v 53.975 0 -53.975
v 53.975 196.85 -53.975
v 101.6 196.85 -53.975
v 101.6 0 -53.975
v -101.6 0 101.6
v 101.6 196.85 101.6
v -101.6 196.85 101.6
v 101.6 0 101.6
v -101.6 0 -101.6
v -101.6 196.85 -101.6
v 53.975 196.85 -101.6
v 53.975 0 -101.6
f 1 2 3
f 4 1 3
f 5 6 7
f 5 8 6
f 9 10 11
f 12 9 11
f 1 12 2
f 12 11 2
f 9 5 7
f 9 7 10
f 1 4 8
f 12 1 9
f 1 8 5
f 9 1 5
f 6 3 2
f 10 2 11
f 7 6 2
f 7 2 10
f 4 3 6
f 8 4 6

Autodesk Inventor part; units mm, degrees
ref_plane "YZ Plane" through (0, 0, 0) normal (1, 0, 0) x (0, 1, 0)
ref_plane "XZ Plane" through (0, 0, 0) normal (0, 1, 0) x (-1, 0, 0)
ref_plane "XY Plane" through (0, 0, 0) normal (0, 0, 1) x (1, 0, 0)
sketch "Sketch1" plane through (0, 0, 0) normal (0, 1, 0) x (-1, 0, 0)
  line L0 (101.6, -101.6) -> (-101.6, -101.6)
  line L1 (-101.6, -101.6) -> (-101.6, 101.6)
  line L2 (-101.6, 101.6) -> (101.6, 101.6)
  line L3 (101.6, 101.6) -> (101.6, -101.6)
  line L4 (101.6, -101.6) -> (-101.6, 101.6) construction
  line L5 (-101.6, -101.6) -> (101.6, 101.6) construction
  point P0 (0, 0)
  dimension "d0" = 203.2
  dimension "d1" = 203.2
extrude "Extrusion1" add sketch "Sketch1" along normal blind 196.85
sketch "Sketch2" plane through (0, 196.85, 0) normal (0, 1, 0) x (1, 0, 0)
  line L0 (101.6, -101.6) -> (101.6, 101.6) projected
  line L1 (101.6, 101.6) -> (53.975, 101.6)
  line L2 (53.975, 101.6) -> (53.975, 53.975)
  line L3 (53.975, 53.975) -> (101.6, 53.975)
  line L4 (101.6, 53.975) -> (101.6, 101.6)
  point P0 (0, 0)
  point P1 (101.6, 53.975)
  dimension "d4" = 47.625
  dimension "d5" = 47.625
extrude "Extrusion2" cut sketch "Sketch2" against normal up to surface (196.85 mm away)
properties part number "1-32" material "Limestone"
